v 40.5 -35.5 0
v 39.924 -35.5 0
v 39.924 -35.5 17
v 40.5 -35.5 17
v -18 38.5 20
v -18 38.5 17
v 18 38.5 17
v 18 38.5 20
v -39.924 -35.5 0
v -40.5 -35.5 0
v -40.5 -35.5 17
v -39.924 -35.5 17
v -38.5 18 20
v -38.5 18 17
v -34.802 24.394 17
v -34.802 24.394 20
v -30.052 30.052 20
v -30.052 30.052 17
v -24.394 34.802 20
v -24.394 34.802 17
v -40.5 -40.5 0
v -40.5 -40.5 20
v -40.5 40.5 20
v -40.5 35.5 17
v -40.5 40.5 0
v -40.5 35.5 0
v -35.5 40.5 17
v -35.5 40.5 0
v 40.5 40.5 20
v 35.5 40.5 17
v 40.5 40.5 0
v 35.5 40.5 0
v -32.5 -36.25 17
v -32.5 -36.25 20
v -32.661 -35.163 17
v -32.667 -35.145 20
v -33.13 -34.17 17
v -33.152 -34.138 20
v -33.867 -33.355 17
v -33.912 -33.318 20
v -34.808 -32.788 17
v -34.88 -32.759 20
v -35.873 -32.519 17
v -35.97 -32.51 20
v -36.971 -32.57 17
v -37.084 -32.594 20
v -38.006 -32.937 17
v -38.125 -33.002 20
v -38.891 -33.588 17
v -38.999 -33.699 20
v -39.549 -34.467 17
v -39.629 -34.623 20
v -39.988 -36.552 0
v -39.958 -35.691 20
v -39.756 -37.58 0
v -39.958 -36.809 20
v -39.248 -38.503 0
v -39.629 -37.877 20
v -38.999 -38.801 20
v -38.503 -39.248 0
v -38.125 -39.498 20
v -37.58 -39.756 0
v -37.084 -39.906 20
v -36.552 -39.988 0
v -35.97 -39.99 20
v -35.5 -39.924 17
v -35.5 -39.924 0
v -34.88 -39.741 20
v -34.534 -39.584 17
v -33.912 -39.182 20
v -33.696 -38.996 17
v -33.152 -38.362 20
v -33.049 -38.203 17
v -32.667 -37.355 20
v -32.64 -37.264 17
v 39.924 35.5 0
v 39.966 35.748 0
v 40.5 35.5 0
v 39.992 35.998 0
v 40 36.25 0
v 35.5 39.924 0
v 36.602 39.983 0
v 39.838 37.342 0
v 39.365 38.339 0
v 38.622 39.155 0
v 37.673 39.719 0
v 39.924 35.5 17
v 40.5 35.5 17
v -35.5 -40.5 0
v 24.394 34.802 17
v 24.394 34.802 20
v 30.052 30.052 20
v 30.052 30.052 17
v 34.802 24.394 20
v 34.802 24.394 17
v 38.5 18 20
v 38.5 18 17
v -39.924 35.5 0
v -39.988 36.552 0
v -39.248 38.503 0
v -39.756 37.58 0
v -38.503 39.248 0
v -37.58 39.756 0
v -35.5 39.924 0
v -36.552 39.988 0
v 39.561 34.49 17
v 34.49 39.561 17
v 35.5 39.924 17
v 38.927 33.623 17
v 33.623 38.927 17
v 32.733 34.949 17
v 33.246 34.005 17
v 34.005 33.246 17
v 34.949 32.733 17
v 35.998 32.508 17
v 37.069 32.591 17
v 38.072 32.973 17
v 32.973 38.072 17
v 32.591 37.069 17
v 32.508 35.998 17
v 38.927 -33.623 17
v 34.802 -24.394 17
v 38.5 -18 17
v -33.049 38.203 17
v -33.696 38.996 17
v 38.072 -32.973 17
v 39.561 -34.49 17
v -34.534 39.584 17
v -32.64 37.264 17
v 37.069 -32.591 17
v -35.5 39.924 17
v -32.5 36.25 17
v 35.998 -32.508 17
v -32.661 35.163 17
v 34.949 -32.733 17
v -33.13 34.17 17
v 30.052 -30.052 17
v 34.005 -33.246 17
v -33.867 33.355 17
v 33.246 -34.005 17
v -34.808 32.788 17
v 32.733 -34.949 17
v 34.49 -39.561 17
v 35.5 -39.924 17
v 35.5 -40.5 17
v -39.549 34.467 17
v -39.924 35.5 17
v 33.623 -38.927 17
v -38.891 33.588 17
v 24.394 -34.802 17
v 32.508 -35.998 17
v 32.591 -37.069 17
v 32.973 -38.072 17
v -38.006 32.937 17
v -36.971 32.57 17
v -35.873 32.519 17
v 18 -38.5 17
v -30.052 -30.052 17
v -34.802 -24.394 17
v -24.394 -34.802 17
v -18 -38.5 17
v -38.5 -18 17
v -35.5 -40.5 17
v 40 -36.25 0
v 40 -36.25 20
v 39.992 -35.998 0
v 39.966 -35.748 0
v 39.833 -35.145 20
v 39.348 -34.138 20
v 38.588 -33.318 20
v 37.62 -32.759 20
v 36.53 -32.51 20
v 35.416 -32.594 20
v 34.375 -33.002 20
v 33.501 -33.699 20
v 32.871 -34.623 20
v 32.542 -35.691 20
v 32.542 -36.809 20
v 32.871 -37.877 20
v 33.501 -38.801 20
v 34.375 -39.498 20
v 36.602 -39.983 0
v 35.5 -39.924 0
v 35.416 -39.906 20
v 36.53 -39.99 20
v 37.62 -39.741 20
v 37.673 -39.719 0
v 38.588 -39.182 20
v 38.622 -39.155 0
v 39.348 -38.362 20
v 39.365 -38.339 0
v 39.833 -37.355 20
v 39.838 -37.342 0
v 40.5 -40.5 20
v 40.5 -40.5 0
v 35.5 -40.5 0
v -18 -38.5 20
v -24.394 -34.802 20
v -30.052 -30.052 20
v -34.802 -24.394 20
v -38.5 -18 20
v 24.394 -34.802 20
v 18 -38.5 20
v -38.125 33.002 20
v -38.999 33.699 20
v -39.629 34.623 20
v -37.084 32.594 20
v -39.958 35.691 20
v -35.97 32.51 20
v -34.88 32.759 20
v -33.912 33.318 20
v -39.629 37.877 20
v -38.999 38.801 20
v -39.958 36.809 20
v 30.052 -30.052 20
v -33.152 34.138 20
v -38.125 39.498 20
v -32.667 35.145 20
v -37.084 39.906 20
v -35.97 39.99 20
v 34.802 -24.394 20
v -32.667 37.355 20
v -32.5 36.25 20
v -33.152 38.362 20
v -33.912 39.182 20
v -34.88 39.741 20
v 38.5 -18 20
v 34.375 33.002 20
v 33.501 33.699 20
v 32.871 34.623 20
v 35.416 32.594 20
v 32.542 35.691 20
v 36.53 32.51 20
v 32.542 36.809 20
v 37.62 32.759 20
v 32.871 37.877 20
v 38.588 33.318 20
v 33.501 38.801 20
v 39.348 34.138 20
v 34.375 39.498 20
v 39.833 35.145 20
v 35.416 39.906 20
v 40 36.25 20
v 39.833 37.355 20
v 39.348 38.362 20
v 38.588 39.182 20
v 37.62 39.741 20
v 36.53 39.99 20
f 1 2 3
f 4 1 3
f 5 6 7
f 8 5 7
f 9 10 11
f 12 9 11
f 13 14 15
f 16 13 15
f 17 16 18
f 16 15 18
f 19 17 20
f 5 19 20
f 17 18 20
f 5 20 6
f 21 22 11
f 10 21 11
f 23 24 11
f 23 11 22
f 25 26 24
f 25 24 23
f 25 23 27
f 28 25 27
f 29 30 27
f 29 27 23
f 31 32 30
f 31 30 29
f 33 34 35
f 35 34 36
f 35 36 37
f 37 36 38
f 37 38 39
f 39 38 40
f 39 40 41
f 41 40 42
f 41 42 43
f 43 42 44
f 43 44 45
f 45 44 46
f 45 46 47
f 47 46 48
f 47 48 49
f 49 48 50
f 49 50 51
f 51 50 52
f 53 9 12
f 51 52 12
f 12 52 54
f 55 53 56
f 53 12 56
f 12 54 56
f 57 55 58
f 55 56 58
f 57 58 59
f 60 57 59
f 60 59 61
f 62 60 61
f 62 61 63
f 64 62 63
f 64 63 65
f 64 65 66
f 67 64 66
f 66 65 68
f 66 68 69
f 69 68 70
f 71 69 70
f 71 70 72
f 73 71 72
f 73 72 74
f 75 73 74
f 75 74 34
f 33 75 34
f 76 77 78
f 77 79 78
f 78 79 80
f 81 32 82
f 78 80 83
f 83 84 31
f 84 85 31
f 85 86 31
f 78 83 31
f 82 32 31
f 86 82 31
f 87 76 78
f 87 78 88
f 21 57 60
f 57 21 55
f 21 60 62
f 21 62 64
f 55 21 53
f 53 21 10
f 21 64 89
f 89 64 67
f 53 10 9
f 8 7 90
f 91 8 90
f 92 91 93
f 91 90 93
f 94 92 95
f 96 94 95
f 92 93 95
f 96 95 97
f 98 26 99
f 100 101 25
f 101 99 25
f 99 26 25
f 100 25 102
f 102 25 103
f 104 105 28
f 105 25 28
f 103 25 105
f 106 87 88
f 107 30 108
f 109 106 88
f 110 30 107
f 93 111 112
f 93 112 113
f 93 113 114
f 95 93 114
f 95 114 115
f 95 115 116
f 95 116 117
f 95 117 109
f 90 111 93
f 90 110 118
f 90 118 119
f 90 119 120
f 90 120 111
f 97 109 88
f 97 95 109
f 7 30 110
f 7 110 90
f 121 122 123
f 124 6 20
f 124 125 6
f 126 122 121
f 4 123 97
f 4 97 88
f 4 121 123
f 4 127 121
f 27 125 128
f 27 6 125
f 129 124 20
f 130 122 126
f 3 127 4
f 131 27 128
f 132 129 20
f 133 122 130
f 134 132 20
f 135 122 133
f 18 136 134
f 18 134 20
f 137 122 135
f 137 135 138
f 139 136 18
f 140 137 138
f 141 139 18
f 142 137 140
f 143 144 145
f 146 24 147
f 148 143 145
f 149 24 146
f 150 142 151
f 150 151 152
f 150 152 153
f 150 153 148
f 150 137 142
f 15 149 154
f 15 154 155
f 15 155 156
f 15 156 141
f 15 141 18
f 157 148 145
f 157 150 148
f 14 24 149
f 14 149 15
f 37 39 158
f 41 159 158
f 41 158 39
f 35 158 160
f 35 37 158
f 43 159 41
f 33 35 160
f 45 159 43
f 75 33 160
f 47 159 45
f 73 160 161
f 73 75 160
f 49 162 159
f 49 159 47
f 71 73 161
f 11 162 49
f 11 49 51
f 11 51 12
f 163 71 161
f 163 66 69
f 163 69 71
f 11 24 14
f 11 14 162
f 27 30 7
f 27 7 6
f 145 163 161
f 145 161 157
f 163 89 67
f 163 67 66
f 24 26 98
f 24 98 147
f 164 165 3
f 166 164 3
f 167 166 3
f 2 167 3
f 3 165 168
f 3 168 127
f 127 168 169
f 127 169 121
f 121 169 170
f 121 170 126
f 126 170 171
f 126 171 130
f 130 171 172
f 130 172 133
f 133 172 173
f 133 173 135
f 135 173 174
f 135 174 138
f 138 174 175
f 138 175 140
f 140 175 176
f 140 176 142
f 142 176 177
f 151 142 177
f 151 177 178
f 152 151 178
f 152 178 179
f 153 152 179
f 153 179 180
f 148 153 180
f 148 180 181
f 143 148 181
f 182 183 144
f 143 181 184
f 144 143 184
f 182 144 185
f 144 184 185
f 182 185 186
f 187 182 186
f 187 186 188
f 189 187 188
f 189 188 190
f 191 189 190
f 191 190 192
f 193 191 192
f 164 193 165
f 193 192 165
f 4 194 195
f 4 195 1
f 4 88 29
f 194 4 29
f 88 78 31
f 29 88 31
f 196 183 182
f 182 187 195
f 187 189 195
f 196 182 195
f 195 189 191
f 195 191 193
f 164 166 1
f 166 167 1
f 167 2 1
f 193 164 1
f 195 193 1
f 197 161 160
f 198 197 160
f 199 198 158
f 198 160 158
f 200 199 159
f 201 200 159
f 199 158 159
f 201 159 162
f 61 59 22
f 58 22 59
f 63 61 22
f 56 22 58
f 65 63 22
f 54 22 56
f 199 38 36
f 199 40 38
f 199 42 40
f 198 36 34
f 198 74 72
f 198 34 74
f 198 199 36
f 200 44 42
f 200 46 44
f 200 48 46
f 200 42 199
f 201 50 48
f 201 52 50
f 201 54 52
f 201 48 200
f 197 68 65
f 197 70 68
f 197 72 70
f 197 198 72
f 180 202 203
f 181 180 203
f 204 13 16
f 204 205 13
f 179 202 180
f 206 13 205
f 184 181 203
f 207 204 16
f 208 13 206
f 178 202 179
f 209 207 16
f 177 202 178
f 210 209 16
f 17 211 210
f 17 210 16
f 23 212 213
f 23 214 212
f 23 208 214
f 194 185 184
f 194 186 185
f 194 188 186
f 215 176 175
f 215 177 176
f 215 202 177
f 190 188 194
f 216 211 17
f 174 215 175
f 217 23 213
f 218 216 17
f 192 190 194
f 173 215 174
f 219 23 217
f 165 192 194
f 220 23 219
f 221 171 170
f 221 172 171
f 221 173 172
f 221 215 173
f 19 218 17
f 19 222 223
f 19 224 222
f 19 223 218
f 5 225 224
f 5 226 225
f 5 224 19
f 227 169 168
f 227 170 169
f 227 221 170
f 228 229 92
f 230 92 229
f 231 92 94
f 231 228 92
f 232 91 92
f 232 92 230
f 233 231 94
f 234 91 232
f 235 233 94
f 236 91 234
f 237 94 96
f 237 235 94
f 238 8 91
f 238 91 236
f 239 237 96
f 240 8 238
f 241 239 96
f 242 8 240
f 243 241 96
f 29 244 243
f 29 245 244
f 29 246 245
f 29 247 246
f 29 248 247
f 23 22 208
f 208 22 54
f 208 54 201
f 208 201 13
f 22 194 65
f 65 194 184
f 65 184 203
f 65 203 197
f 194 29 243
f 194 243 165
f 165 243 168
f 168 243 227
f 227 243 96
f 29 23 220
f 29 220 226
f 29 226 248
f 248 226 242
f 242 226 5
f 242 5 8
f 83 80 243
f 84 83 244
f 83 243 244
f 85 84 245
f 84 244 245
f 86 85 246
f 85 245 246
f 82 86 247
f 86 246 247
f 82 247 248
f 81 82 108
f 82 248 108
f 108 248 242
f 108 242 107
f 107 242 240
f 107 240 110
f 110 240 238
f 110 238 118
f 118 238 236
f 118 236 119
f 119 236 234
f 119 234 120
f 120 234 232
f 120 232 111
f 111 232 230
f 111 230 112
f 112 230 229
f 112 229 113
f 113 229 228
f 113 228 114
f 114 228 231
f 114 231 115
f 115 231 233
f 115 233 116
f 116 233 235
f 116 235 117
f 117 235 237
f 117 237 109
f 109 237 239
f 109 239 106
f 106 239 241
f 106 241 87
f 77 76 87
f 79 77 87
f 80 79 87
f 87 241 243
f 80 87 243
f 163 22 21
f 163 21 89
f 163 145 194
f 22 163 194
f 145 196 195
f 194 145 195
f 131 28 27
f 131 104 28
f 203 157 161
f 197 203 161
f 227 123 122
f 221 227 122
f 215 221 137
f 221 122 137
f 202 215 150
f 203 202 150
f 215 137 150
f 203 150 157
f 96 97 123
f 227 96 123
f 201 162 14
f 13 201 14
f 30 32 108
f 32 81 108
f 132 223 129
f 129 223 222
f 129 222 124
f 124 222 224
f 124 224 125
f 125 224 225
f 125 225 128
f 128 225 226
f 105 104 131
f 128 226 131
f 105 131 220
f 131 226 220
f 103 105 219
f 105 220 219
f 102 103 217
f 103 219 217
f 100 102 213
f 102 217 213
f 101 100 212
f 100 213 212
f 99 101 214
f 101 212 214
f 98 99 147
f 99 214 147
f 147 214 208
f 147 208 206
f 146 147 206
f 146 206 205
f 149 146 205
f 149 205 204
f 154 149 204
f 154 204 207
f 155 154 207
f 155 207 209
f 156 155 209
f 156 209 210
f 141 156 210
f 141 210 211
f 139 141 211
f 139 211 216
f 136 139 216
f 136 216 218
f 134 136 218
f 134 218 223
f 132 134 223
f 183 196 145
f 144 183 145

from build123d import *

# Parameters (mm, degrees)
F0_W     = 81
F0_H     = 81
F1_DEPTH = 20
F2_W     = 71
F2_H     = 20.792734
F3_DEPTH = 81.001
F4_W     = 71
F4_H     = 29.603668
F5_DEPTH = 81.001
F6_R     = 3.75
F7_DEPTH = 20.001


with BuildPart() as f1:
    # F0 (on Top) → F1 (new body)
    with BuildSketch(Plane.XY):
        Rectangle(F0_W, F0_H)
        with BuildLine():
            ThreePointArc((-38.5, 18), (-30.052038, 30.052038), (-18, 38.5))
            Line((-18, 38.5), (18, 38.5))
            ThreePointArc((18, 38.5), (30.052038, 30.052038), (38.5, 18))
            Line((38.5, 18), (38.5, -18))
            ThreePointArc((38.5, -18), (30.052038, -30.052038), (18, -38.5))
            Line((18, -38.5), (-18, -38.5))
            ThreePointArc((-18, -38.5), (-30.052038, -30.052038), (-38.5, -18))
            Line((-38.5, -18), (-38.5, 18))
        make_face(mode=Mode.SUBTRACT)
    extrude(amount=F1_DEPTH)

    # F2 (on face) → F3 (cut, through all)
    with BuildSketch(Plane.XZ.offset(40.5)):
        with Locations((0, 6.603633)):
            Rectangle(F2_W, F2_H)
    extrude(amount=-F3_DEPTH, mode=Mode.SUBTRACT)

    # F4 (on face) → F5 (cut, through all)
    with BuildSketch(Plane(origin=(-40.5, 0, 0), x_dir=(0, -1, 0), z_dir=(-1, 0, 0))):
        with Locations((0, 2.198166)):
            Rectangle(F4_W, F4_H)
    extrude(amount=-F5_DEPTH, mode=Mode.SUBTRACT)

    # F6 (on face) → F7 (cut, through all)
    with BuildSketch(Plane.XY.offset(20)):
        with Locations((-36.25, 36.25)):
            Circle(F6_R)
        with Locations((36.25, 36.25)):
            Circle(F6_R)
        with Locations((-36.25, -36.25)):
            Circle(F6_R)
        with Locations((36.25, -36.25)):
            Circle(F6_R)
    extrude(amount=-F7_DEPTH, mode=Mode.SUBTRACT)


solid = f1.part
